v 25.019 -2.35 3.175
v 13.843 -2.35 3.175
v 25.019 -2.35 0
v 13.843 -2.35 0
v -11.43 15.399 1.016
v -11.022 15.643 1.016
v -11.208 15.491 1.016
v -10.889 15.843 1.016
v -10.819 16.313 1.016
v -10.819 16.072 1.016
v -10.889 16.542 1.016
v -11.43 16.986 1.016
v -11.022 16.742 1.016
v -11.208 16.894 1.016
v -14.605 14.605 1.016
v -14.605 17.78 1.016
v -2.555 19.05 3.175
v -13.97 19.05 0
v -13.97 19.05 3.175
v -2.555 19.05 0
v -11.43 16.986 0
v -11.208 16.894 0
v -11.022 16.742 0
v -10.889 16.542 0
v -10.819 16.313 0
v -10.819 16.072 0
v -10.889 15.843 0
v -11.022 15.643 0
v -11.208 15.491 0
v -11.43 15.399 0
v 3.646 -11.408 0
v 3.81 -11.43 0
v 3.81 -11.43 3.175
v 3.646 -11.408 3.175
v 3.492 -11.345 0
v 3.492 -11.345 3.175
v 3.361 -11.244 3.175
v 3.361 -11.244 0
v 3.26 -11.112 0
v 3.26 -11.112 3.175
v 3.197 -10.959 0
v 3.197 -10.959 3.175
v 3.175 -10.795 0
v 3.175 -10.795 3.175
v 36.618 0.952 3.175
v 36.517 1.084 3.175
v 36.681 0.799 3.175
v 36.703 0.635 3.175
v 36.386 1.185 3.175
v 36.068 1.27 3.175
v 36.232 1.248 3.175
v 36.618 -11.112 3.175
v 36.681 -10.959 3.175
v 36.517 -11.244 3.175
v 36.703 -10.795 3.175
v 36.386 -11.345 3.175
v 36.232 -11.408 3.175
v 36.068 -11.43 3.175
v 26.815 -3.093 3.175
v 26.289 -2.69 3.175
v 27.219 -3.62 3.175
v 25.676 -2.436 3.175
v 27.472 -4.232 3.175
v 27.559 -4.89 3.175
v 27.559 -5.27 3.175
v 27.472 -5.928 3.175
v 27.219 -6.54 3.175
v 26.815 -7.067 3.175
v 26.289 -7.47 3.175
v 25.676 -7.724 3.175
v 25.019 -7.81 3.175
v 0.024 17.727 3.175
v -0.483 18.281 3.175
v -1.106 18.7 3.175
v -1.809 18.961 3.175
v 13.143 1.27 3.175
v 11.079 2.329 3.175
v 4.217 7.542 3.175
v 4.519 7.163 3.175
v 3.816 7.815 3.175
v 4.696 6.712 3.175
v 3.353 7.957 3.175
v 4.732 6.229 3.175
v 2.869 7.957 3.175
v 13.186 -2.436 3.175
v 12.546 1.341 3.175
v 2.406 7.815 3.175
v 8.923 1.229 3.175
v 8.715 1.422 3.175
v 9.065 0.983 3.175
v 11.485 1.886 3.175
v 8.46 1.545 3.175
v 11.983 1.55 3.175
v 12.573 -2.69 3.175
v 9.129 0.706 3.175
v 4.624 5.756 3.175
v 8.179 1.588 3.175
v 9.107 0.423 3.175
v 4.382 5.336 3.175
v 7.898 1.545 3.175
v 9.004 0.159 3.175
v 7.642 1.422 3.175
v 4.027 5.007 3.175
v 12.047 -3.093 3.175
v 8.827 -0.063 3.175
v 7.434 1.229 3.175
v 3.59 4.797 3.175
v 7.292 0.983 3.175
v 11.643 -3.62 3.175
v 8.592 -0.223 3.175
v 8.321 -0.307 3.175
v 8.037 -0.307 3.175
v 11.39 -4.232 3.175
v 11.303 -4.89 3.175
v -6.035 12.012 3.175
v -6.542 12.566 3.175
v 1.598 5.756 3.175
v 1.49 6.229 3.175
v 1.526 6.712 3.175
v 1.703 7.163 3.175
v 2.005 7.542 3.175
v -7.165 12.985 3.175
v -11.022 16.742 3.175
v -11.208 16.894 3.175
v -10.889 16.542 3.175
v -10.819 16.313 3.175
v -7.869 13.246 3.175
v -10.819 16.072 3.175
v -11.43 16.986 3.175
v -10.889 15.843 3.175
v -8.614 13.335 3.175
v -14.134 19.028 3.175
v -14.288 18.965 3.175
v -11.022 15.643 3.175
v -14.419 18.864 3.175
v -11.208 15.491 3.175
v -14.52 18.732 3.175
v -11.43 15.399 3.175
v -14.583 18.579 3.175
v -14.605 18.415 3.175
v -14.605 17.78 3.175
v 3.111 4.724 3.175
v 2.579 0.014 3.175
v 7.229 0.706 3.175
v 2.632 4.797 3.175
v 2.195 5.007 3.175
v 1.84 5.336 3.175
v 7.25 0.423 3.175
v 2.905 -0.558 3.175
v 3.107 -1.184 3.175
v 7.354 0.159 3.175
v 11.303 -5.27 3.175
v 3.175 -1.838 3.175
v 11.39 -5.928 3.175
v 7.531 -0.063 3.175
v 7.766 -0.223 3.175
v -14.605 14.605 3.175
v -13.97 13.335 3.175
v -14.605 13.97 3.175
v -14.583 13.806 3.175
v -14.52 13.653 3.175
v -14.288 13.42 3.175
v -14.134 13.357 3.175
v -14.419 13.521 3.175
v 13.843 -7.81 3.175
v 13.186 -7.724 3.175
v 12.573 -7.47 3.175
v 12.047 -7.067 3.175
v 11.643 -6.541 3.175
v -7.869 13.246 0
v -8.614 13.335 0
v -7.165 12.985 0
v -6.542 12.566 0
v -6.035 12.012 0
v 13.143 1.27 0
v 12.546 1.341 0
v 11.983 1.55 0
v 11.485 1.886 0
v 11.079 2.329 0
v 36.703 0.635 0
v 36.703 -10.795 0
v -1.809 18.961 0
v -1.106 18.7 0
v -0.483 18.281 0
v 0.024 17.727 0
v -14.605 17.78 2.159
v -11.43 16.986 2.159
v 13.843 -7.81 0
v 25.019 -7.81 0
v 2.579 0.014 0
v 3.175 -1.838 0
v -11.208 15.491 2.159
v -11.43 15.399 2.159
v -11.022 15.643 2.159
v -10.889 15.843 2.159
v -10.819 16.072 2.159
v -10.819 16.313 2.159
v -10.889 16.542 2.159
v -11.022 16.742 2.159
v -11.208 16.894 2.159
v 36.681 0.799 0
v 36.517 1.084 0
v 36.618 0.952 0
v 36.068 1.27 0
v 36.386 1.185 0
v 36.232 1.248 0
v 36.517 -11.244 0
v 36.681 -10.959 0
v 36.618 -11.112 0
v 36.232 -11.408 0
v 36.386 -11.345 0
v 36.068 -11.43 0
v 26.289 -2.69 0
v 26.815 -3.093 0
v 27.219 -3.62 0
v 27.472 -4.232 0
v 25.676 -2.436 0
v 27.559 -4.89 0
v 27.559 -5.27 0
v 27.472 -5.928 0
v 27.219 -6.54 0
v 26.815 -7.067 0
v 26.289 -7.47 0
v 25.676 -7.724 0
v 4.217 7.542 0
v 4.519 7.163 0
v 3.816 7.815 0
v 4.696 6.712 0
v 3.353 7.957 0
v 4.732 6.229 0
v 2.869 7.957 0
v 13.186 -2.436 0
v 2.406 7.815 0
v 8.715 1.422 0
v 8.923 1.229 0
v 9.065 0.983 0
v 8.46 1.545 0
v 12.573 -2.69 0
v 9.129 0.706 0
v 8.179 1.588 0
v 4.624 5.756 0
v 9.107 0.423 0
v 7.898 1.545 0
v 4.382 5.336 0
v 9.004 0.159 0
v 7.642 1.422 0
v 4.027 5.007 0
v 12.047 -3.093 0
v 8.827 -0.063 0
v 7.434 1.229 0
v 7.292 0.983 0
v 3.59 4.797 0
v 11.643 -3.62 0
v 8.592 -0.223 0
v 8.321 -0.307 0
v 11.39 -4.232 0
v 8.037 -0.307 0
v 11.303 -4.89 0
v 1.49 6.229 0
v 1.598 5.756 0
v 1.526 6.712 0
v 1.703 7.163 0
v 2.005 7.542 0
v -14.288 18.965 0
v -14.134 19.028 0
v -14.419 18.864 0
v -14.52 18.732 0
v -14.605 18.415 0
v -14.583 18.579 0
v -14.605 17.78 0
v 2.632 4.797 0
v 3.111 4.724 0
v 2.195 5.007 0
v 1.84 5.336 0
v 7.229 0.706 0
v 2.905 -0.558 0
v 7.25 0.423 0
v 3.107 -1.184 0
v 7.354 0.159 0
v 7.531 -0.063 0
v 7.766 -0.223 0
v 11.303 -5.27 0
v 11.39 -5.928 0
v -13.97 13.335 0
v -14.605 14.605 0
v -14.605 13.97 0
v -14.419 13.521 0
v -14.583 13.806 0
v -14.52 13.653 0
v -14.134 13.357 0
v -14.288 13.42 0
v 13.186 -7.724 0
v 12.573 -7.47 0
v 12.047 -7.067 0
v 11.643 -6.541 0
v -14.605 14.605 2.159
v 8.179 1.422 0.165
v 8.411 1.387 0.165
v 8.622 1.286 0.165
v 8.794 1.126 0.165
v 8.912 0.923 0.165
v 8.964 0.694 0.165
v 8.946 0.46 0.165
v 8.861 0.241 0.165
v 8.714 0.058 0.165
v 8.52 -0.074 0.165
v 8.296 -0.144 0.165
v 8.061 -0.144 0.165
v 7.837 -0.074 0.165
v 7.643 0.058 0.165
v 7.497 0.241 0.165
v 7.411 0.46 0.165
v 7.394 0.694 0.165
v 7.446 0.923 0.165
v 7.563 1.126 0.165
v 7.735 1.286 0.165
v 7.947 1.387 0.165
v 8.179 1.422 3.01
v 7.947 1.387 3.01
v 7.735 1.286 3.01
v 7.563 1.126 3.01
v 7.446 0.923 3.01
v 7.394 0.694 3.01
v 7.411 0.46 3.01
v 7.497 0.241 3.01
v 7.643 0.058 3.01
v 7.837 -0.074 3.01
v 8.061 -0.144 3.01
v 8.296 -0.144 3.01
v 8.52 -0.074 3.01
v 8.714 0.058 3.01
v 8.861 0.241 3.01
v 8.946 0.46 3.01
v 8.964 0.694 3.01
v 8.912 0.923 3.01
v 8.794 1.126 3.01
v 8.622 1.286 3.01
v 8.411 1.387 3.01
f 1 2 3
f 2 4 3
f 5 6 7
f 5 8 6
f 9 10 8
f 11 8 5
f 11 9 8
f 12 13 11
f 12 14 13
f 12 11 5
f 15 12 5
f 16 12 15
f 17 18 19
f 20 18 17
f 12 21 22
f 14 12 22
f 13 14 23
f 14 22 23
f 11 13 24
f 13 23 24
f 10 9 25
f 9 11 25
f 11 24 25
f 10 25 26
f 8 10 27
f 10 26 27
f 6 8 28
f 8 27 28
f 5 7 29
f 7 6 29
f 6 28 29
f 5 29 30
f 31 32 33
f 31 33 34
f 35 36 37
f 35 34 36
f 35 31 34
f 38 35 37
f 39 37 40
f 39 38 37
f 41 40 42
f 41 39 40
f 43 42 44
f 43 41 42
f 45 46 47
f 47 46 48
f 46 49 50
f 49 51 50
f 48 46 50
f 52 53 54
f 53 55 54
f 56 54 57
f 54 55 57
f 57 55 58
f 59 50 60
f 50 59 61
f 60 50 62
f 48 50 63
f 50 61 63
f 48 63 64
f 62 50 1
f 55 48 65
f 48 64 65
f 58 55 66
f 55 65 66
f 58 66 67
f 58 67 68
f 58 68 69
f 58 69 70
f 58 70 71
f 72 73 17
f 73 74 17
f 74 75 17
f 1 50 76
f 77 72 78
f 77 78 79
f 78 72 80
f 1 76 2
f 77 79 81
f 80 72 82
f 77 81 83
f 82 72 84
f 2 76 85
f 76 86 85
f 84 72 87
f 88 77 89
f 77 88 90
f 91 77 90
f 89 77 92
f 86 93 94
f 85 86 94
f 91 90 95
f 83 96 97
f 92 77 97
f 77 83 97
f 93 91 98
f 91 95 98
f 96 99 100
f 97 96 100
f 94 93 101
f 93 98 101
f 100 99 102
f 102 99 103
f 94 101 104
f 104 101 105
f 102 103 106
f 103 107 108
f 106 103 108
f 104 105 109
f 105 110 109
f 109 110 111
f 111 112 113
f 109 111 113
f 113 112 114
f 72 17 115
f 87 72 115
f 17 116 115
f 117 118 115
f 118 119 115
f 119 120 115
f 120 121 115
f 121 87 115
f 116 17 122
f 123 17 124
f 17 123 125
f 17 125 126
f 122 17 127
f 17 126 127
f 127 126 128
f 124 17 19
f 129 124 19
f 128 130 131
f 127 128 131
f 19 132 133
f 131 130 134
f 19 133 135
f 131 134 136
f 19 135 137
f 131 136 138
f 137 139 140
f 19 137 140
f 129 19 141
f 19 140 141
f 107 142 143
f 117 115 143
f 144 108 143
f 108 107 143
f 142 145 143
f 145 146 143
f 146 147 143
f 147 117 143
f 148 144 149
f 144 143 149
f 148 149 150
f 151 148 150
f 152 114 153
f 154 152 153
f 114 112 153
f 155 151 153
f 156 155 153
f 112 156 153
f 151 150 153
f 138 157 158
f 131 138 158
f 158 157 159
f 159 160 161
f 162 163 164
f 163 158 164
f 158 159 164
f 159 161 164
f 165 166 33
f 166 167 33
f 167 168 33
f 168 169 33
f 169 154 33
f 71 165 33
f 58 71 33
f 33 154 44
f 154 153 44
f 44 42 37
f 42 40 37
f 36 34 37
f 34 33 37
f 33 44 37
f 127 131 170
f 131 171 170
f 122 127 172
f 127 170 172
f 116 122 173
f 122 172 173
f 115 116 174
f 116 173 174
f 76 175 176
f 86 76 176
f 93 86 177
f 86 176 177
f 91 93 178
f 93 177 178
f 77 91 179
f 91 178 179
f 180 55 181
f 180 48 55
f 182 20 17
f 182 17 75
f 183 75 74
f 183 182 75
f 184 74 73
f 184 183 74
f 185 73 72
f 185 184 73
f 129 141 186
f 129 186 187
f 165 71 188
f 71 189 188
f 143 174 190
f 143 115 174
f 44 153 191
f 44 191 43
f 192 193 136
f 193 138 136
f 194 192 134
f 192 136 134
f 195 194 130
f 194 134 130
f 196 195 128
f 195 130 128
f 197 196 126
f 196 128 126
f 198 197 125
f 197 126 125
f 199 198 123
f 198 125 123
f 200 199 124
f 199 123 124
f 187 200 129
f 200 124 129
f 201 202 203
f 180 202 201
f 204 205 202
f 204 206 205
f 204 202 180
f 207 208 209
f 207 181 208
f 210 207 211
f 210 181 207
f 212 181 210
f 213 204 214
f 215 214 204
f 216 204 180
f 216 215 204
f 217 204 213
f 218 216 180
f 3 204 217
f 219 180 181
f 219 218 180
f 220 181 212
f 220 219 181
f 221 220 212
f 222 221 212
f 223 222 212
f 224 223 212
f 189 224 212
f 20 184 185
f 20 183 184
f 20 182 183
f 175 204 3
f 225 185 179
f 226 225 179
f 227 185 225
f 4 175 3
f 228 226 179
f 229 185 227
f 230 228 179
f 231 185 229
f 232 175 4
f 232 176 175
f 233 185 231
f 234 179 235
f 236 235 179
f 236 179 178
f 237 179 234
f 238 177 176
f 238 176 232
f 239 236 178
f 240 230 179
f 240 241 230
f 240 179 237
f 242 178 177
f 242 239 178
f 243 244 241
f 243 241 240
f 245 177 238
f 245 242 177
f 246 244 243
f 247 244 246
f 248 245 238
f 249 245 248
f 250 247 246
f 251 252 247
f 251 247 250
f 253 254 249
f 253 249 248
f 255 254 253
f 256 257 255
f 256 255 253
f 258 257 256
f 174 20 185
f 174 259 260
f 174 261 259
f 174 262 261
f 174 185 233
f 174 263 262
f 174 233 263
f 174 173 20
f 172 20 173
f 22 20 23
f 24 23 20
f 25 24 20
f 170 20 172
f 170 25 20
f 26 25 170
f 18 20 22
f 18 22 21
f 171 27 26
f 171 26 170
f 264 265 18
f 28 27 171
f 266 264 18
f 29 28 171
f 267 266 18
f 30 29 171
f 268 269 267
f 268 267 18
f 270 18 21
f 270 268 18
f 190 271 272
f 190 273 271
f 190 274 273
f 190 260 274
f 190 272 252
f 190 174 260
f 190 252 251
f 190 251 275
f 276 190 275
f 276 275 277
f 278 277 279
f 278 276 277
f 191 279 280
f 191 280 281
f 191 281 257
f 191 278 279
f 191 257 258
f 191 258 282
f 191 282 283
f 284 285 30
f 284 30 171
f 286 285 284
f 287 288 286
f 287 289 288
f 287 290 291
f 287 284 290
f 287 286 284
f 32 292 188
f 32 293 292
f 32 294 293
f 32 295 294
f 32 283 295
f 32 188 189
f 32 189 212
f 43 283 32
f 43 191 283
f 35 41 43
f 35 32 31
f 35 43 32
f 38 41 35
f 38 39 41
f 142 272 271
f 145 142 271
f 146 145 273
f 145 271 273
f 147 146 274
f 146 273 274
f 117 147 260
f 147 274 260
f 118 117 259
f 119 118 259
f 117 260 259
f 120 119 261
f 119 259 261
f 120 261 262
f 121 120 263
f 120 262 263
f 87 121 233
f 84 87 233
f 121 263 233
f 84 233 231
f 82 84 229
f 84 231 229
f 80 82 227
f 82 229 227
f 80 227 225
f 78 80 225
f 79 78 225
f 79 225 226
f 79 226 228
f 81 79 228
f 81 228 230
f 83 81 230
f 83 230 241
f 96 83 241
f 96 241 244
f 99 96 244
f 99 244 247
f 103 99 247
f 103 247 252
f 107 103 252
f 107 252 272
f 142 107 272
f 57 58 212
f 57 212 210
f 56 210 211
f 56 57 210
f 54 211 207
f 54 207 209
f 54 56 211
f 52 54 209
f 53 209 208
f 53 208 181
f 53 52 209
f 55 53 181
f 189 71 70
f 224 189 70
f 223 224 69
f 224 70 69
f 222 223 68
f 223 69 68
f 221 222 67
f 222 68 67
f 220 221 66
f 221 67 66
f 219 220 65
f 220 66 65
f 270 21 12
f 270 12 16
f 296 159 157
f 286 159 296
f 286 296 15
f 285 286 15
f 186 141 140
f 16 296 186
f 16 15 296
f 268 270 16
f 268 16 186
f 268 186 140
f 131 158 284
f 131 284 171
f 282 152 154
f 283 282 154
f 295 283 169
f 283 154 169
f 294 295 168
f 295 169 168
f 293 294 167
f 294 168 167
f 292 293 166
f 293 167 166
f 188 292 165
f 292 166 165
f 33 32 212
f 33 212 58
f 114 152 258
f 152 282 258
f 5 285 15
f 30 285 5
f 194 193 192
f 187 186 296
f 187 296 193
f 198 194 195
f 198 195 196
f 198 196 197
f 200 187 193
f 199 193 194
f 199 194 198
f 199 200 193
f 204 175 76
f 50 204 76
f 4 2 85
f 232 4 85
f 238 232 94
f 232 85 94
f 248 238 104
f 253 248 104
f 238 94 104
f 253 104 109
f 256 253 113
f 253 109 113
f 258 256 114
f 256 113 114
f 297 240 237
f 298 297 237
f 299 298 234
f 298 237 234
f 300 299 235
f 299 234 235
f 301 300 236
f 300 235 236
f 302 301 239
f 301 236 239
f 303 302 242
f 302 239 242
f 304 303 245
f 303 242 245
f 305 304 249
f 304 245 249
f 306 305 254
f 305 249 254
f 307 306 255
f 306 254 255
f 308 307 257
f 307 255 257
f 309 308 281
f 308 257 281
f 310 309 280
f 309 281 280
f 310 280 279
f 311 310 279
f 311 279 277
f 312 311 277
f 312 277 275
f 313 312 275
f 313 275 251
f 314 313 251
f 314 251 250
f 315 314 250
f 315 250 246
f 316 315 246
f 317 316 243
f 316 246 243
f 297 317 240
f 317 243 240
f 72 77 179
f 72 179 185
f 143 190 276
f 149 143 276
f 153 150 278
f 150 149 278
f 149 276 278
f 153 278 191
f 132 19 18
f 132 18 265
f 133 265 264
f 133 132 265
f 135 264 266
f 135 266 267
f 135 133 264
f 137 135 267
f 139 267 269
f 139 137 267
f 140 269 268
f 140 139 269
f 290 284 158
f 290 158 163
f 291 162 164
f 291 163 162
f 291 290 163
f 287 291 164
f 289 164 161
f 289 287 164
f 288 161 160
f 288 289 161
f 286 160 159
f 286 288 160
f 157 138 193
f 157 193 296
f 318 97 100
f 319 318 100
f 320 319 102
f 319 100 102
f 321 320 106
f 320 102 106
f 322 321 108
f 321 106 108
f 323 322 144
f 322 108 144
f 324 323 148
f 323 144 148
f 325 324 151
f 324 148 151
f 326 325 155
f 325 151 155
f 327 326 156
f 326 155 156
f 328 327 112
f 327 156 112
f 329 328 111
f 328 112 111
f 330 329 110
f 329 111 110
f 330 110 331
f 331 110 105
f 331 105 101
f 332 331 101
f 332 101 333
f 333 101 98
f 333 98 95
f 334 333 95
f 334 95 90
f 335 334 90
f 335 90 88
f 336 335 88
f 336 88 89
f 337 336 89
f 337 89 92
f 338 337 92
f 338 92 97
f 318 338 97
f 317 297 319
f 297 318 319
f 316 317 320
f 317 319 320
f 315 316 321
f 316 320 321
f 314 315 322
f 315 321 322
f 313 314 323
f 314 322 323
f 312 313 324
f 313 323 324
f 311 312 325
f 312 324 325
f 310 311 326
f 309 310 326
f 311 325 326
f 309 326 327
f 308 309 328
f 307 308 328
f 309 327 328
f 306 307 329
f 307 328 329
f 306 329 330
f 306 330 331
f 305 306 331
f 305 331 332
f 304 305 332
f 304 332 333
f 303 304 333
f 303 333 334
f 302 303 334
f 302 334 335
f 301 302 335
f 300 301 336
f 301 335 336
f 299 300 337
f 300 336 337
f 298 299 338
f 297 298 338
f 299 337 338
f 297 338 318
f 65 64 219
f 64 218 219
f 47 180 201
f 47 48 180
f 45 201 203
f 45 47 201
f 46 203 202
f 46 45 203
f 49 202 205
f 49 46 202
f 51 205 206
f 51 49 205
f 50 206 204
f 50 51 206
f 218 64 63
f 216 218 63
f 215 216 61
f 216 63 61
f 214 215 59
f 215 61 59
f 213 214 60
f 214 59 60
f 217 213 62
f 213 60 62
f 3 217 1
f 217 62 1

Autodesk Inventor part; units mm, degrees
ref_plane "YZ Plane" through (0, 0, 0) normal (1, 0, 0) x (0, 1, 0)
sketch "Sketch1" plane through (0, 0, 0) normal (0, 0, 1) x (1, 0, 0)
  line L0 (-20.447, 0) -> (20.447, 0) projected
  line L1 (0, -17.526) -> (0, 25.146) projected
  line L2 (14.605, -11.43) -> (-14.605, -11.43)
  line L3 (-14.605, -11.43) -> (-14.605, 19.05)
  line L4 (-14.605, 19.05) -> (14.605, 19.05)
  line L5 (14.605, 19.05) -> (14.605, -11.43)
  line L6 (-14.605, 16.6688) -> (-14.605, 19.05)
  point P0 (0, 0)
  dimension "d0" = 29.21
  dimension "d1" = 30.48
  dimension "d2" = 14.605
  dimension "d232" = 19.05
extrude "Extrusion2" add sketch "Sketch1" along normal blind 3.175
sketch "Sketch2" plane through (0, 0, 3.175) normal (0, 0, 1) x (1, 0, 0)
  line L0 (-14.605, -11.43) -> (-14.605, 19.05) projected
  line L1 (-14.605, 17.78) -> (-11.43, 16.9862)
  line L2 (-11.43, 16.9862) -> (-11.43, 15.3987)
  line L3 (-11.43, 15.3987) -> (-14.605, 14.605)
  line L4 (-14.605, 17.78) -> (-14.605, 14.605)
  line L5 (-14.605, 17.78) -> (-14.605, 19.05)
  arc A0 (-11.43, 15.3987) -> (-11.43, 16.9862) centre (-11.6284, 16.1925) ccw
  point P0 (0, 0)
  dimension "d21" = 3.175
  dimension "d22" = 1.5875
  dimension "d23" = 1.27
  dimension "d66" = 3.175
extrude "Extrusion3" cut sketch "Sketch2" against normal blind 1.016
sketch "Sketch11" plane through (0, 0, 3.175) normal (0, 0, 1) x (1, 0, 0)
  line L0 (14.605, -11.43) -> (-14.605, -11.43) projected
  line L1 (14.605, 1.27) -> (14.605, 19.05)
  line L2 (-14.605, 13.335) -> (-6.985, 13.335)
  line L3 (-6.985, 13.335) -> (3.175, -0.8164)
  line L4 (10.795, -11.43) -> (-14.605, -11.43)
  line L5 (14.605, 19.05) -> (14.605, -11.43) projected
  line L6 (14.605, 1.27) -> (11.8393, 1.27)
  line L7 (11.8393, 1.27) -> (-0.9259, 19.05)
  line L8 (-0.9259, 19.05) -> (14.605, 19.05)
  line L9 (-14.605, 13.335) -> (-14.605, -11.43)
  line L10 (3.175, -0.8164) -> (3.175, -11.43)
  point P0 (0, 0)
  point P1 (0, -11.43)
  dimension "d220" = 7.62
  dimension "d221" = 25.4
  dimension "d226" = 12.7
  dimension "d230" = 8.255
  dimension "d263" = 7.62
  dimension "d264" = 54.324
extrude "Extrusion10" cut sketch "Sketch11" against normal through all
sketch "Sketch12" plane through (0, 0, 3.175) normal (0, 0, 1) x (1, 0, 0)
  line L0 (-14.605, 19.05) -> (14.605, 19.05) projected
  line L1 (-14.605, -11.43) -> (-14.605, 19.05) projected
  line L2 (-0.2249, 19.05) -> (-2.4073, 19.05)
  line L3 (-0.2419, 3.9428) -> (6.4638, 8.7572)
  line L4 (-0.2419, 3.9428) -> (3.111, 6.35)
  line L5 (3.111, 6.35) -> (6.4638, 8.7572)
  line L6 (-6.985, 13.335) -> (3.175, -0.8164) projected
  line L7 (11.8393, 1.27) -> (-0.9259, 19.05) projected
  line L8 (0, 25.146) -> (0, -17.526) projected
  line L9 (-20.447, 0) -> (20.447, 0) projected
  point P0 (-14.605, 14.605)
  point P1 (10.795, -11.43)
  dimension "d231" = 6.35
hole "Hole9" at (3.111, 6.35, 3.175) direction (0, 0, -1) diameter 3.2512 end through all
sketch "Sketch16" plane through (14.605, -11.43, 3.175) normal (1, 0, 0) x (0, 0, -1)
  line L0 (3.175, 12.7) -> (0, 12.7) projected
  line L1 (0, 12.7) -> (0, 0) projected
  line L2 (3.175, 12.7) -> (3.175, 0) projected
  line L3 (3.175, 0) -> (0, 0) projected
  line L4 (0, 12.7) -> (3.175, 12.7)
  line L5 (3.175, 12.7) -> (3.175, 0)
  line L6 (3.175, 0) -> (0, 0)
  line L7 (0, 0) -> (0, 12.7)
extrude "Extrusion14" add sketch "Sketch16" along normal blind 22.098
hole "Hole14-Orig threaded Tscrew hole" [suppressed]
sketch "Sketch17" plane through (0, 0, 0) normal (0, 0, 1) x (1, 0, 0)
  circle A0 centre (8.1788, 0.635) radius 0.7937
  circle A1 centre (3.111, 6.35) radius 1.6256 projected
  point P0 (0, 0)
  dimension "d235" = 1.5875
  dimension "d237" = 8.1788
  dimension "d238" = 5.0678
  dimension "d239" = 5.715
hole "Hole16" at (8.1788, 0.635, 0) direction (0, 0, 1) diameter 1.5748 end through all countersink diameter 1.905 countersink angle 90
fillet "Fillet9" radius 3.175 3 edges at (-0.9259, 19.05, 1.5875) (-6.985, 13.335, 1.5875) (3.175, -0.8164, 1.5875)
fillet "Fillet10" radius 0.635 2 edges at (-14.605, 19.05, 1.5875) (-14.605, 13.335, 1.5875)
ref_plane "Work Plane1" through (0, 0, 1.5875) normal (0, 0, 1) x (1, 0, 0)
mirror "Mirror1" about plane through (0, 0, 1.5875) normal (0, 0, 1) of "Extrusion3"
sketch "Sketch18" plane through (0, 0, 0) normal (0, 0, 1) x (1, 0, 0)
  line L0 (-13.97, 19.05) -> (-2.5549, 19.05) projected
  line L1 (-13.97, 13.335) -> (-8.6141, 13.335) projected
  line L2 (-14.605, 14.605) -> (-14.605, 17.78) projected
  line L3 (11.8393, 1.27) -> (0.0242, 17.7267) projected
  line L4 (-6.0349, 12.0117) -> (2.5791, 0.0135) projected
  circle A0 centre (3.111, 6.35) radius 1.6256 projected
  circle A1 centre (8.1788, 0.635) radius 0.7874 projected
  line L5 (-14.605, 19.05) -> (-0.9259, 19.05)
  line L6 (-6.985, 13.335) -> (-14.605, 13.335)
  line L7 (-14.605, 13.335) -> (-14.605, 19.05)
  line L8 (2.6983, -0.1524) -> (-6.985, 13.335)
  line L9 (-0.9259, 19.05) -> (7.3914, 7.4652)
  line L10 (7.3914, -0.1524) -> (2.6983, -0.1524)
  line L11 (7.3914, 7.4652) -> (7.3914, -0.1524)
  circle A2 centre (3.111, 6.35) radius 1.6256
  line L12 (-14.605, 17.78) -> (-14.605, 18.415) projected
  point P0 (10.8892, 2.5933)
  point P1 (9.8449, -10.1067)
  point P2 (10.795, -11.43)
  point P3 (6.985, -6.1232)
  dimension "d251" = 13.6791
  dimension "d252" = 5.715
  dimension "d253" = 7.62
  dimension "d254" = 14.2613
  dimension "d255" = 7.6176
  dimension "d256" = 4.6931
  dimension "d257" = 16.6035
  dimension "d258" = 21.9964
  dimension "d259" = 19.2024
  dimension "d260" = 12.7
  dimension "d261" = 17.716
fillet "Fillet11" radius 0.635 3 edges at (36.703, -11.43, 1.5875) (36.703, 1.27, 1.5875) (3.175, -11.43, 1.5875)
fillet "Fillet12" radius 2.54 1 edges at (11.8393, 1.27, 1.5875)
sketch "Sketch19" plane through (0, 0, 0) normal (0, 0, 1) x (1, 0, 0)
  line L0 (11.303, -2.3495) -> (27.559, -2.3495)
  line L1 (27.559, -2.3495) -> (27.559, -7.8105)
  line L2 (27.559, -7.8105) -> (11.303, -7.8105)
  line L3 (11.303, -7.8105) -> (11.303, -2.3495)
  line L4 (27.559, -5.08) -> (11.303, -5.08) construction
  line L5 (19.431, -2.3495) -> (19.431, -7.8105) construction
  line L6 (36.703, -10.795) -> (36.703, 0.635) construction
  line L7 (36.068, -11.43) -> (3.81, -11.43) construction
  point P0 (0, 0)
  dimension "d267" = 16.256
  dimension "d268" = 5.461
  dimension "d269" = 6.35
  dimension "d274" = 19.431
extrude "Extrusion15" cut sketch "Sketch19" along normal through all
fillet "Fillet13" radius 2.54 4 edges at (11.303, -7.8105, 1.5875) (11.303, -2.3495, 1.5875) (27.559, -7.8105, 1.5875) (27.559, -2.3495, 1.5875)
ref_plane "Work Plane2" through (0, -5.0927, 0) normal (0, 1, 0) x (-1, 0, 0)
chamfer "Chamfer9" distance 0.1651 angle 45 1 edges at (8.1788, -0.1524, 3.175)
equation "\"d2\" = 0.5 * d0"
properties part number "J002859" material "STAINLESS STEEL, 303"
